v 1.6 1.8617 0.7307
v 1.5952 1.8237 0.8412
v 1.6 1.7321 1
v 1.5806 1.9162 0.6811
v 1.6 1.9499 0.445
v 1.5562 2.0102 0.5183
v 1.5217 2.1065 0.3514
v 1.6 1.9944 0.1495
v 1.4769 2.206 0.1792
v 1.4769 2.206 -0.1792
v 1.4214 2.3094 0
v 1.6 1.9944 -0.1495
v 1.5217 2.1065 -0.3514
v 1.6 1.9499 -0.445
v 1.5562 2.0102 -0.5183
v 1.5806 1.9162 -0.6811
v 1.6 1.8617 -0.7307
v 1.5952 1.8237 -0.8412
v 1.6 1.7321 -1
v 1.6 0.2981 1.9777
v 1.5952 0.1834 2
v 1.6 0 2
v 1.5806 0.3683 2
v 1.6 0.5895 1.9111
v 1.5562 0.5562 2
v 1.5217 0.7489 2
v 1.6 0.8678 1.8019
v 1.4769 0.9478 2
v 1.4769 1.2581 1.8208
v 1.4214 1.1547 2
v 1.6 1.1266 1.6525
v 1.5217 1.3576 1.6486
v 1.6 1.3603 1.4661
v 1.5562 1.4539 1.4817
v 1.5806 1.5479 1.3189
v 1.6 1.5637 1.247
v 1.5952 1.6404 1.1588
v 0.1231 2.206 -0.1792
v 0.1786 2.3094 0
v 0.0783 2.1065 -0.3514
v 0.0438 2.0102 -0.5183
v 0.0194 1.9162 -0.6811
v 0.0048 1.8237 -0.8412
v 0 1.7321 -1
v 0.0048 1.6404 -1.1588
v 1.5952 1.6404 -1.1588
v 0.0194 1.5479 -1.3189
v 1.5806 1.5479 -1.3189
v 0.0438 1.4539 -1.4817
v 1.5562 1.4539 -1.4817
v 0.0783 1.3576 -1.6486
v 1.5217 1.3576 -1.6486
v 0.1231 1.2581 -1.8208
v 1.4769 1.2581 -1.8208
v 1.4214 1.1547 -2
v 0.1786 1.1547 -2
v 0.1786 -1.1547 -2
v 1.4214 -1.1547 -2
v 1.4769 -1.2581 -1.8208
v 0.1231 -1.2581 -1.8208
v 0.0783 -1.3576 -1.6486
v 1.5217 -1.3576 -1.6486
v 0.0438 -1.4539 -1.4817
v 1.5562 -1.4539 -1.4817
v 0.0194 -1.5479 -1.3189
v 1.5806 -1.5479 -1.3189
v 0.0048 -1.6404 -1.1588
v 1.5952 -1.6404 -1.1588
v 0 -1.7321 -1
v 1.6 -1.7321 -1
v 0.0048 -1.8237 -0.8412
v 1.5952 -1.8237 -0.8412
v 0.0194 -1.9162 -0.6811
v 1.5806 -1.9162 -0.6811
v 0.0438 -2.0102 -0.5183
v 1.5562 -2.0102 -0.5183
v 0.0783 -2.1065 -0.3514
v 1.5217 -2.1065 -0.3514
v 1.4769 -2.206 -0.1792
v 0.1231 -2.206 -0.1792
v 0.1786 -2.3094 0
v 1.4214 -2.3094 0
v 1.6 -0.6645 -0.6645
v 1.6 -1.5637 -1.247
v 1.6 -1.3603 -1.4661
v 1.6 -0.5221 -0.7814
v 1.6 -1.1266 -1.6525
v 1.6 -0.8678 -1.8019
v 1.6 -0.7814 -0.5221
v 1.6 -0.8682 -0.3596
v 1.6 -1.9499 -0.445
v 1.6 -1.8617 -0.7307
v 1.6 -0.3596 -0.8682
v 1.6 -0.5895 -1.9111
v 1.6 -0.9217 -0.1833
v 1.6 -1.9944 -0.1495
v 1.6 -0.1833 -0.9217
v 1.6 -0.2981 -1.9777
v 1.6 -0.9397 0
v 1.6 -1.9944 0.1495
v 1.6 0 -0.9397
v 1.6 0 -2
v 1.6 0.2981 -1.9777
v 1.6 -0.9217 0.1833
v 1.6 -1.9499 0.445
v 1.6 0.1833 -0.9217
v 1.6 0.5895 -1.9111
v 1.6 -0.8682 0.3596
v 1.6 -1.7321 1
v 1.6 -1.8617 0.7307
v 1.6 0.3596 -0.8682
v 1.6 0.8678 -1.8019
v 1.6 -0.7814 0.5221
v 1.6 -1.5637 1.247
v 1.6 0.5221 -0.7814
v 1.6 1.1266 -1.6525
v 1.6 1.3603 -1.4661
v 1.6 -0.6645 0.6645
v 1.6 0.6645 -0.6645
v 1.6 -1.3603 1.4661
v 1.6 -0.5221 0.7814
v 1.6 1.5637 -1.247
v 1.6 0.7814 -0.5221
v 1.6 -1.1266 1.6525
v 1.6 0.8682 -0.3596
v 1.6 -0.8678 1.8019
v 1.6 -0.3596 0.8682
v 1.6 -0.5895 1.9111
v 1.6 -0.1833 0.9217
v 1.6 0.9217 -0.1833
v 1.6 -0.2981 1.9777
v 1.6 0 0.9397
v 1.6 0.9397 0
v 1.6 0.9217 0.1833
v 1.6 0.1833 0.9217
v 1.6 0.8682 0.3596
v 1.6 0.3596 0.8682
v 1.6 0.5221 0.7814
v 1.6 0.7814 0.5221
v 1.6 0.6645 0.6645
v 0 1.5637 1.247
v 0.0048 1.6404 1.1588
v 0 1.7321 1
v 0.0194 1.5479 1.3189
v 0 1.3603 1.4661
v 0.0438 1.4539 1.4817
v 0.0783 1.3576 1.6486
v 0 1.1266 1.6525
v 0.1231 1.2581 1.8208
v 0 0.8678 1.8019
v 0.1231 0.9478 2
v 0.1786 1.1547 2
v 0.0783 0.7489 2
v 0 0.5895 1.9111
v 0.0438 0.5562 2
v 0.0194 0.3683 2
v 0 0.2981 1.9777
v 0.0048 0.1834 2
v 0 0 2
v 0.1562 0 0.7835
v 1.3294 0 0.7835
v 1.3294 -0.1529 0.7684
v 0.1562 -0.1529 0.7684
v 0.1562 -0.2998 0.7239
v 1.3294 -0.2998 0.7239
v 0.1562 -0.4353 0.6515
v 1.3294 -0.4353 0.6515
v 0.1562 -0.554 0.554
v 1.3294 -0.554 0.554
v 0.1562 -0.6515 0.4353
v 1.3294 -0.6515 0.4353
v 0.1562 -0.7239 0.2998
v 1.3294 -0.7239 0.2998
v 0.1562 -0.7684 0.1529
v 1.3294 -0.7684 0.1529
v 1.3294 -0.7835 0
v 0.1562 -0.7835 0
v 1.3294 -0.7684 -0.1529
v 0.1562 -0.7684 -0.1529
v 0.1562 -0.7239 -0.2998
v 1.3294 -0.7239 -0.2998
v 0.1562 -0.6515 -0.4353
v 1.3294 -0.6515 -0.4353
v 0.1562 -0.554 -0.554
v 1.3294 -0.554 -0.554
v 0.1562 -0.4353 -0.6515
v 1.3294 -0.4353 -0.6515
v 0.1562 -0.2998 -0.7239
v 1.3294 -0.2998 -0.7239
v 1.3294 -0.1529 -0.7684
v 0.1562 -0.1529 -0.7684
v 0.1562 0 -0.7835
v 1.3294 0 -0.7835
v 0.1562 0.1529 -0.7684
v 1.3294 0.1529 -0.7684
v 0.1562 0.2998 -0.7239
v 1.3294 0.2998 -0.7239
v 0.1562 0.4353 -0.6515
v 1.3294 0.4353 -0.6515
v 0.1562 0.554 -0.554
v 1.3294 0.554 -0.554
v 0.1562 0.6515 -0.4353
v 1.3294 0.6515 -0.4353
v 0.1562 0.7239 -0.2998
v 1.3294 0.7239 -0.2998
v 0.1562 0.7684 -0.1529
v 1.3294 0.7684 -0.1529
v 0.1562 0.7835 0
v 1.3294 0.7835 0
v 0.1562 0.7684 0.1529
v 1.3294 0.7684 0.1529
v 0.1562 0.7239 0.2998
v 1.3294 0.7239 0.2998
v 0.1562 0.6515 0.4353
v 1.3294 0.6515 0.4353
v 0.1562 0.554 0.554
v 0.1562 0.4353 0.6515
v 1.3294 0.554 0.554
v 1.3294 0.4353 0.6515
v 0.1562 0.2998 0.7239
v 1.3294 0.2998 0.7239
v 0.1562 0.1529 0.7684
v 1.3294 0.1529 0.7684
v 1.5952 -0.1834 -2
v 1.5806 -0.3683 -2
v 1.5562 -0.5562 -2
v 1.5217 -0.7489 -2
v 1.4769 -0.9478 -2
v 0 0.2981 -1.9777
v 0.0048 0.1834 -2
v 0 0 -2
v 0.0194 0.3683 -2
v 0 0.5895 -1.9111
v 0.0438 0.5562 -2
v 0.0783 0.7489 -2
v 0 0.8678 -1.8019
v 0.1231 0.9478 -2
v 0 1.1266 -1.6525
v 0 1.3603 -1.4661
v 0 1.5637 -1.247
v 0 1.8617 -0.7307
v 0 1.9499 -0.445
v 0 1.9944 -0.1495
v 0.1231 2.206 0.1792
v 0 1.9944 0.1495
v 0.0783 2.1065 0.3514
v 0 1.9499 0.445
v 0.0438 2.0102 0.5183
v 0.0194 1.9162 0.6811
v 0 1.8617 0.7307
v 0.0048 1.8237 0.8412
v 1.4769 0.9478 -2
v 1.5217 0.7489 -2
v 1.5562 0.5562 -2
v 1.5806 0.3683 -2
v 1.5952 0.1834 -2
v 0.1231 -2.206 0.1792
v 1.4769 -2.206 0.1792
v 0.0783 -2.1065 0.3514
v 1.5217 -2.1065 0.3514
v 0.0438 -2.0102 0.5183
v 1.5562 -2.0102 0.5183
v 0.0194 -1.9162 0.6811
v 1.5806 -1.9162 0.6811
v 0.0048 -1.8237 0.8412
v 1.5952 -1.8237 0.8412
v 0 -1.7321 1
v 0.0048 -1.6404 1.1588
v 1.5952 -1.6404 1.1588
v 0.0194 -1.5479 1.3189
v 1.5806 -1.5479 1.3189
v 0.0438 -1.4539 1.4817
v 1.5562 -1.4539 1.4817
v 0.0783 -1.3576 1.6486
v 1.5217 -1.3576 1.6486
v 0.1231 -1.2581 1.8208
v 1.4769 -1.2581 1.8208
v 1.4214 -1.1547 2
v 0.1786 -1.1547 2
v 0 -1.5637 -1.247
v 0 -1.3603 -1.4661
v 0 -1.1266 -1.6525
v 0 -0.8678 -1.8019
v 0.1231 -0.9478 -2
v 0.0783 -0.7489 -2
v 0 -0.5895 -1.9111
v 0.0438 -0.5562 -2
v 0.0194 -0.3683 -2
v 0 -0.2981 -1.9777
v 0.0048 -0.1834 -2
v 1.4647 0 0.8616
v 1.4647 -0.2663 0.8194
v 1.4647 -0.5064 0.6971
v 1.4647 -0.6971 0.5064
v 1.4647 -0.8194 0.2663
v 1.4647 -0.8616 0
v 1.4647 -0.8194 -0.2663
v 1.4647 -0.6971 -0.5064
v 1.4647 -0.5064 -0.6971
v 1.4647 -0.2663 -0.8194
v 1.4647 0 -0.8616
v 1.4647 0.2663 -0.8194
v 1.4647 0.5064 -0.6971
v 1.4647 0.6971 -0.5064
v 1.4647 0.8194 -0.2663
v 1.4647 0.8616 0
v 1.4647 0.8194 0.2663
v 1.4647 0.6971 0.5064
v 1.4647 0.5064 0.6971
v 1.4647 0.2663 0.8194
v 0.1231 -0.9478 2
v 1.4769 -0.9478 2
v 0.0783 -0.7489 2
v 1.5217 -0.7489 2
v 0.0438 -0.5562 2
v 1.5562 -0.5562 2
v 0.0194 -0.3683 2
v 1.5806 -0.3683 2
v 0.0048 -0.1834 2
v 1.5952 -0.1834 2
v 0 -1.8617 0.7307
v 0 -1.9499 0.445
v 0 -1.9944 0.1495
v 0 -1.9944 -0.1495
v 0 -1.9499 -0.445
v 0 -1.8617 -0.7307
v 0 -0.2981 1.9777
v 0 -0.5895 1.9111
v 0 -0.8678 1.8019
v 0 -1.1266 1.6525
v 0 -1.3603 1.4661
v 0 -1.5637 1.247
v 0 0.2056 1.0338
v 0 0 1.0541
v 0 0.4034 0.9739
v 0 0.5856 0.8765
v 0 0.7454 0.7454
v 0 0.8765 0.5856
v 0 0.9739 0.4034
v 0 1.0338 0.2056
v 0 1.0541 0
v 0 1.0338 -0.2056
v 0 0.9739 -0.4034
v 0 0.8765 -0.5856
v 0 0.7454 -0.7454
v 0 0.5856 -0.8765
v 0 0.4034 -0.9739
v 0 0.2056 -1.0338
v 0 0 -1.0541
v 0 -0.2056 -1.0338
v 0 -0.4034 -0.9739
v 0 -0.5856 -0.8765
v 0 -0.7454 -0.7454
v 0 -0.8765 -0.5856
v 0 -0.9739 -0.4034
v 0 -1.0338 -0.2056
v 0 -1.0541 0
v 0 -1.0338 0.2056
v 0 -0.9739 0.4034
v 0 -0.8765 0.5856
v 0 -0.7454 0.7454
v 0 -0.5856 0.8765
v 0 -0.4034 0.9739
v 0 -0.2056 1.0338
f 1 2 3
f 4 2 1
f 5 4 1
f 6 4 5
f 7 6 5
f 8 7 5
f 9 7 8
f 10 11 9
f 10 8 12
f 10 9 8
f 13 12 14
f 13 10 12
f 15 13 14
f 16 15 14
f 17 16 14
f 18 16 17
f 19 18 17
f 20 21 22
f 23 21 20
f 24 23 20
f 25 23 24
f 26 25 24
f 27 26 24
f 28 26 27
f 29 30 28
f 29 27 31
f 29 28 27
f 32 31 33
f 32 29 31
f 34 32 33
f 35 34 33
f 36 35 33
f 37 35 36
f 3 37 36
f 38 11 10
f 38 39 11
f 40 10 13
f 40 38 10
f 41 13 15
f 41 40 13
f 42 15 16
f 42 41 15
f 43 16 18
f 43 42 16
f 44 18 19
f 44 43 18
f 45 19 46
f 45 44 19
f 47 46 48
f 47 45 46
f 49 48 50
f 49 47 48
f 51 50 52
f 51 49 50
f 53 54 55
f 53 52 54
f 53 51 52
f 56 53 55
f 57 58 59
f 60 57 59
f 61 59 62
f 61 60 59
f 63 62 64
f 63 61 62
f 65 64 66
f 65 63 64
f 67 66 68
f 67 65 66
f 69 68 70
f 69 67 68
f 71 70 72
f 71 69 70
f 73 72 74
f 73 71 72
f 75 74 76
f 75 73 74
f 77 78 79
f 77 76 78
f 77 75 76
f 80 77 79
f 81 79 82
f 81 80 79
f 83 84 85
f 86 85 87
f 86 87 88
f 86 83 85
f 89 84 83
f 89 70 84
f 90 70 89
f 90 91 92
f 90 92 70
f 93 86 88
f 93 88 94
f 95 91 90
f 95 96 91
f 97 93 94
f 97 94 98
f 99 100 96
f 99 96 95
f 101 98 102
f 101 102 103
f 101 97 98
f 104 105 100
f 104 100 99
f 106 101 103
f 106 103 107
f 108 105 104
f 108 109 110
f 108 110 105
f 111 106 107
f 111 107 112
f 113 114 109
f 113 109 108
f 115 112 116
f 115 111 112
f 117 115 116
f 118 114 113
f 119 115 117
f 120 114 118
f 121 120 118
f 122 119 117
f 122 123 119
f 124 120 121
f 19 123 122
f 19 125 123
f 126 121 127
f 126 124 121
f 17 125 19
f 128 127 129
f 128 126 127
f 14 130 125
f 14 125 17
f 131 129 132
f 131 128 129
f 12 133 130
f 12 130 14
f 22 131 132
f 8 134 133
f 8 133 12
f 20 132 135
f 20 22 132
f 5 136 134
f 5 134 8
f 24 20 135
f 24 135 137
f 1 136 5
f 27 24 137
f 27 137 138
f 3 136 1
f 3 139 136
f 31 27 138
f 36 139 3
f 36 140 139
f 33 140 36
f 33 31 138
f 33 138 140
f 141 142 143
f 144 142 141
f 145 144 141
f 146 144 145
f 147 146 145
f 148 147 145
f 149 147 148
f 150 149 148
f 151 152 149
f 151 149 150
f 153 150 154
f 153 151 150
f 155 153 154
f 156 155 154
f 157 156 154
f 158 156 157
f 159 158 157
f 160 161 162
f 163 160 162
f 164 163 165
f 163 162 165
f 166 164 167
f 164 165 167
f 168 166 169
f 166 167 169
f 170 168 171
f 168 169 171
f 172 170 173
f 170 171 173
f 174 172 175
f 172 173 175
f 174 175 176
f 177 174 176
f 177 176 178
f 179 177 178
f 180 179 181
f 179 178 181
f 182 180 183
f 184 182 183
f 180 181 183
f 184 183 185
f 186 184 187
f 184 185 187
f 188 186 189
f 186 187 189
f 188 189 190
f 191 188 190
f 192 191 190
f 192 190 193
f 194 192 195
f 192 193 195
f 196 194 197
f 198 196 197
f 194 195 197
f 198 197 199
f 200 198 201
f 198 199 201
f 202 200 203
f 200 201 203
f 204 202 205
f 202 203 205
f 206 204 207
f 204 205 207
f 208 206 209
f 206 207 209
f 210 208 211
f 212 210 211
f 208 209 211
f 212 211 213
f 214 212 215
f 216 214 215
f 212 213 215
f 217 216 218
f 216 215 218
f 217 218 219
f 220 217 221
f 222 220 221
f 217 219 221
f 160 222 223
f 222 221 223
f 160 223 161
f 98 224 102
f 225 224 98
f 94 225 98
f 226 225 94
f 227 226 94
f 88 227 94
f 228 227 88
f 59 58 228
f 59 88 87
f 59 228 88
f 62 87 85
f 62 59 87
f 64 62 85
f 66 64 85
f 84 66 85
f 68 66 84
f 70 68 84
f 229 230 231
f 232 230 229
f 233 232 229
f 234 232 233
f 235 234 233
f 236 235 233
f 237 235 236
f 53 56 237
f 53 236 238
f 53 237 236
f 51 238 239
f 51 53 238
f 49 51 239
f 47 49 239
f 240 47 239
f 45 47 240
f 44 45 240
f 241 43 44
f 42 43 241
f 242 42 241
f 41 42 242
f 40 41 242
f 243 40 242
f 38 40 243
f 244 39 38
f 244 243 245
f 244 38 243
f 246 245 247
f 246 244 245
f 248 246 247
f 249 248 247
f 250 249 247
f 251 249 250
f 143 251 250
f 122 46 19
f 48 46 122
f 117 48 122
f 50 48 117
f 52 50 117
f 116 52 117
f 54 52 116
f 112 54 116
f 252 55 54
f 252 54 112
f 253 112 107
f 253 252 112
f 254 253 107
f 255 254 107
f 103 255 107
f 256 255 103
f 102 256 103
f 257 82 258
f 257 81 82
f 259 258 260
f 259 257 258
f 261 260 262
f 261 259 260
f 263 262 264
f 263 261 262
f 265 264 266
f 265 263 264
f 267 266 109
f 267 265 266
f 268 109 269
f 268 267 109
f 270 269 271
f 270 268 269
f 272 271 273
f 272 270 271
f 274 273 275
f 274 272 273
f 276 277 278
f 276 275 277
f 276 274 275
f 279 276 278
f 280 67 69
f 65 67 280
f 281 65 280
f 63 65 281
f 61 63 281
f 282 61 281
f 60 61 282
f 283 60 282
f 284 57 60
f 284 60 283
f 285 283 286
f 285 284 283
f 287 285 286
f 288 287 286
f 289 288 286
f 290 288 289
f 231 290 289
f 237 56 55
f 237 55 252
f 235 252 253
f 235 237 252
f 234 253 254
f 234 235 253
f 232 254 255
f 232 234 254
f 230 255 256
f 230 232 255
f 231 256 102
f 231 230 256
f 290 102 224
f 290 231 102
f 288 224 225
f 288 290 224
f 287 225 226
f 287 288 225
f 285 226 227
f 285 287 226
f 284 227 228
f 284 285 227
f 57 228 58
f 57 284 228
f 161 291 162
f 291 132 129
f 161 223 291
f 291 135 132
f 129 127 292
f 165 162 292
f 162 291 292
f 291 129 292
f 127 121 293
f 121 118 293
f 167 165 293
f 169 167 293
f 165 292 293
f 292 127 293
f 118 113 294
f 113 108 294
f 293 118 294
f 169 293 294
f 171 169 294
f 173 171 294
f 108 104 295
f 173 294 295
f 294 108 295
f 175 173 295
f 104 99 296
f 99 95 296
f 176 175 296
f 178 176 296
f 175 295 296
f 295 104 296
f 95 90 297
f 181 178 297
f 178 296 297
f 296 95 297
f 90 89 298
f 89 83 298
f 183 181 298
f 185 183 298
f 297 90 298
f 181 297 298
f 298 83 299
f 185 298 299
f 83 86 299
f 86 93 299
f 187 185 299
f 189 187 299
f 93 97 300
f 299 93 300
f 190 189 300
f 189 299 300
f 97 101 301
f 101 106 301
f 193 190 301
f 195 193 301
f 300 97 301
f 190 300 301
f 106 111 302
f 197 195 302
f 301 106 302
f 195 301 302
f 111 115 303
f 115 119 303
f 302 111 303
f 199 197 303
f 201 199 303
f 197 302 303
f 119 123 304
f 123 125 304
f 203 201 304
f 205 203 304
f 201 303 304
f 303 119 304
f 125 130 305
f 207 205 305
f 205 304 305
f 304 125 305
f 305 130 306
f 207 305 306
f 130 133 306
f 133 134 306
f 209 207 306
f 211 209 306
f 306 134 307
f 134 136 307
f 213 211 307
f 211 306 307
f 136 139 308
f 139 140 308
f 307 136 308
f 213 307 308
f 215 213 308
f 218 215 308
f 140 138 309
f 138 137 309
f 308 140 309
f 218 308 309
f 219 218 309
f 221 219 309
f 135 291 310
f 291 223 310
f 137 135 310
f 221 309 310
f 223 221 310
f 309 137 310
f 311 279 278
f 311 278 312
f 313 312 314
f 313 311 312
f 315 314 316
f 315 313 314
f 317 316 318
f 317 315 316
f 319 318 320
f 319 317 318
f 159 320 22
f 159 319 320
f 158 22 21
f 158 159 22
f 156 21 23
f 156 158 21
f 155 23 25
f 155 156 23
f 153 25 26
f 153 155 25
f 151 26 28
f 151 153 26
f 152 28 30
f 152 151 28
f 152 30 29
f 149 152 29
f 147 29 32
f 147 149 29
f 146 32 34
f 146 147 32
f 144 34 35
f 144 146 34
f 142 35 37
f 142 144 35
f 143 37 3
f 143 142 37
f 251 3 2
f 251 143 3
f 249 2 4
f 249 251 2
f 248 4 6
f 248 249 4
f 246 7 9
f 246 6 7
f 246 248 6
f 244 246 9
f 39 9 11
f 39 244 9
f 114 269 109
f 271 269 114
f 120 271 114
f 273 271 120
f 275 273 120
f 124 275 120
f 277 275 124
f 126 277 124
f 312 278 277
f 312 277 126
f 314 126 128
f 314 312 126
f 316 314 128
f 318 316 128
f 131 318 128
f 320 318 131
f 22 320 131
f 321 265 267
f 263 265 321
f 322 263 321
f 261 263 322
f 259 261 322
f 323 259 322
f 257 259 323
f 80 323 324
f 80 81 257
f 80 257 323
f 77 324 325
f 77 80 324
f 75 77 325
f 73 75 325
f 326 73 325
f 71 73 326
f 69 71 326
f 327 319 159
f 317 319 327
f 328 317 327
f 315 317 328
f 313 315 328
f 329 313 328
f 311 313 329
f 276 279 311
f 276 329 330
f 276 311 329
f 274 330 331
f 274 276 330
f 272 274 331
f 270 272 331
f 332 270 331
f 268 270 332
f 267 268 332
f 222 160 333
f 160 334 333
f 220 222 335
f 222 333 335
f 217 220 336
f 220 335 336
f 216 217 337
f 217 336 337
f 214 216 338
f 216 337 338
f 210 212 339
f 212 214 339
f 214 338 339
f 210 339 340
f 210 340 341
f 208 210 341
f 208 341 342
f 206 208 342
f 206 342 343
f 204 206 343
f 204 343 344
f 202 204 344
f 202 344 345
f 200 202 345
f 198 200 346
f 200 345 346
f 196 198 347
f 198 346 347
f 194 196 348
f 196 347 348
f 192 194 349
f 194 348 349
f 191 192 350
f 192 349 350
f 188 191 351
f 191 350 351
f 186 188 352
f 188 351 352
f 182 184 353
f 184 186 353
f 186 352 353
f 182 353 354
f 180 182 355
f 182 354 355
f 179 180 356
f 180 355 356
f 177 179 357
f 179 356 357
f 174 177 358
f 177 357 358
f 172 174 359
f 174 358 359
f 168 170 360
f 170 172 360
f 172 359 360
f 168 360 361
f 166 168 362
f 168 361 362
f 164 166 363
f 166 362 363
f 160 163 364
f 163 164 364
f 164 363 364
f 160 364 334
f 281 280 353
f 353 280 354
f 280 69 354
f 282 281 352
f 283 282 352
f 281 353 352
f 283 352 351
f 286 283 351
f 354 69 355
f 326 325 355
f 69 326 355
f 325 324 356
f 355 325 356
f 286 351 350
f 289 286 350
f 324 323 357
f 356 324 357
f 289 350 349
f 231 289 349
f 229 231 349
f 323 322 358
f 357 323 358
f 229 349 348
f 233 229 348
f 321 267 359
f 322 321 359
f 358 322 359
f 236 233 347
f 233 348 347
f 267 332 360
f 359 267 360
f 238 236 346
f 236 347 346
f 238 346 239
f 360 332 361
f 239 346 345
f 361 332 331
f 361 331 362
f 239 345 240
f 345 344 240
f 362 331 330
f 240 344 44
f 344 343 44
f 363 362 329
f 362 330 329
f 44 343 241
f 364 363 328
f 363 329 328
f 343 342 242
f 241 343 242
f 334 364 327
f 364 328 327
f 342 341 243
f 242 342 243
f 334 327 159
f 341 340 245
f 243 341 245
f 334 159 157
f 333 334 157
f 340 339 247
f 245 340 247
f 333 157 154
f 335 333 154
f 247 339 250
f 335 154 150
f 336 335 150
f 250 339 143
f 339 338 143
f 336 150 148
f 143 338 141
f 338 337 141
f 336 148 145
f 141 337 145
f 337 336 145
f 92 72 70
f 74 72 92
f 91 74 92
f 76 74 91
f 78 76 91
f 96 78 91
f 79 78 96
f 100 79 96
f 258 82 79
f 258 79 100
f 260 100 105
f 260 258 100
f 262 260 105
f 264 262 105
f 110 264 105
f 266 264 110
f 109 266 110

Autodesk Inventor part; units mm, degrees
ref_plane "YZ Plane" through (0, 0, 0) normal (1, 0, 0) x (0, 1, 0)
sketch "Sketch1" plane through (0, 0, 0) normal (1, 0, 0) x (0, 1, 0)
  line L0 (2.3094, 0) -> (1.1547, -2)
  line L1 (1.1547, -2) -> (-1.1547, -2)
  line L2 (-1.1547, -2) -> (-2.3094, 0)
  line L3 (-2.3094, 0) -> (-1.1547, 2)
  line L4 (-1.1547, 2) -> (1.1547, 2)
  line L5 (1.1547, 2) -> (2.3094, 0)
  point P0 (0, 0)
  point P1 (0, 0)
  dimension "d0" = 4.6188
extrude "Body" add sketch "Sketch1" along normal blind 1.6
sketch "Sketch2" plane through (0, 0, 0) normal (-1, 0, 0) x (0, 0, 1)
  point P0 (0, 0)
hole "Thread" at (0, 0, 0) direction (1, 0, 0) diameter 1.567 end through all thread size "M2x0.4" class "6H" standard "ISO Metric profile"
chamfer "Chamfer1" distance 0.2706 angle 30 1 edges at (0, 0, -0.7835) measured on face at (0, -1.3696, 0.815)
chamfer "Chamfer4" distance 0.2706 angle 30 1 edges at (1.6, 0, -0.7835) measured on face at (0.6375, 0.063, 0.781)
sketch "Sketch3" plane through (0, 0, 0) normal (0, 0, 1) x (1, 0, 0)
  line L0 (0, 2.3094) -> (1.6, 2.3094) projected
  line L1 (1.6, 1.1547) -> (1.6, 2.3094) projected
  line L2 (-0.48, 0) -> (2.88, 0) projected
  line L3 (1.4214, 2.3094) -> (1.6, 2)
  dimension "d3" = 4
  dimension "d4" = 30
revolve "Chamfer3" cut sketch "Sketch3" angle 360 about axis through (-10, 0, 0) along (1, 0, 0)
ref_plane "Work Plane1" through (6.3161, 0, 0) normal (0, 0.866, -0.5) x (-1, 0, 0)
ref_plane "Work Plane2" through (0.8, 0, 0) normal (1, 0, 0) x (0, 0, -1)
mirror "Mirror1" about plane through (0.8, 0, 0) normal (1, 0, 0) of "Chamfer3"
sketch "Sketch5" plane through (1.6, 0, 0) normal (1, 0, 0) x (0, 0, -1)
  point P0 (0, 0)
equation "\"d31\" = -0.5 * GD1 + 0.5 * NND"
equation "\"d0\" = 1.1547 * SW"
equation "\"d13\" = -0.5 * GD1 + 0.5 * NND"
equation "\"d21\" = -0.5 * GD1 + 0.5 * NND"
equation "\"d3\" = SW01"
equation "\"d4\" = ANG2"
equation "\"ANG2\" = 30deg"
equation "\"NND\" = 3"
equation "\"KOH\" = 2.4"
equation "\"SW\" = 4"
equation "\"SW01\" = SW"
equation "\"GUL\" = 0.541266 * PTC"
equation "\"TOA\" = 30deg"
equation "\"PTC\" = 0.5"
equation "\"E0\" = 1.155 * SW"
equation "\"THREADDIA\" = 3"
equation "\"GAL\" = 0.541266 * PTC"
equation "\"GD1\" = 2.458734"
properties part number "KS B 1012 - M 3" material "Stainless Steel"
